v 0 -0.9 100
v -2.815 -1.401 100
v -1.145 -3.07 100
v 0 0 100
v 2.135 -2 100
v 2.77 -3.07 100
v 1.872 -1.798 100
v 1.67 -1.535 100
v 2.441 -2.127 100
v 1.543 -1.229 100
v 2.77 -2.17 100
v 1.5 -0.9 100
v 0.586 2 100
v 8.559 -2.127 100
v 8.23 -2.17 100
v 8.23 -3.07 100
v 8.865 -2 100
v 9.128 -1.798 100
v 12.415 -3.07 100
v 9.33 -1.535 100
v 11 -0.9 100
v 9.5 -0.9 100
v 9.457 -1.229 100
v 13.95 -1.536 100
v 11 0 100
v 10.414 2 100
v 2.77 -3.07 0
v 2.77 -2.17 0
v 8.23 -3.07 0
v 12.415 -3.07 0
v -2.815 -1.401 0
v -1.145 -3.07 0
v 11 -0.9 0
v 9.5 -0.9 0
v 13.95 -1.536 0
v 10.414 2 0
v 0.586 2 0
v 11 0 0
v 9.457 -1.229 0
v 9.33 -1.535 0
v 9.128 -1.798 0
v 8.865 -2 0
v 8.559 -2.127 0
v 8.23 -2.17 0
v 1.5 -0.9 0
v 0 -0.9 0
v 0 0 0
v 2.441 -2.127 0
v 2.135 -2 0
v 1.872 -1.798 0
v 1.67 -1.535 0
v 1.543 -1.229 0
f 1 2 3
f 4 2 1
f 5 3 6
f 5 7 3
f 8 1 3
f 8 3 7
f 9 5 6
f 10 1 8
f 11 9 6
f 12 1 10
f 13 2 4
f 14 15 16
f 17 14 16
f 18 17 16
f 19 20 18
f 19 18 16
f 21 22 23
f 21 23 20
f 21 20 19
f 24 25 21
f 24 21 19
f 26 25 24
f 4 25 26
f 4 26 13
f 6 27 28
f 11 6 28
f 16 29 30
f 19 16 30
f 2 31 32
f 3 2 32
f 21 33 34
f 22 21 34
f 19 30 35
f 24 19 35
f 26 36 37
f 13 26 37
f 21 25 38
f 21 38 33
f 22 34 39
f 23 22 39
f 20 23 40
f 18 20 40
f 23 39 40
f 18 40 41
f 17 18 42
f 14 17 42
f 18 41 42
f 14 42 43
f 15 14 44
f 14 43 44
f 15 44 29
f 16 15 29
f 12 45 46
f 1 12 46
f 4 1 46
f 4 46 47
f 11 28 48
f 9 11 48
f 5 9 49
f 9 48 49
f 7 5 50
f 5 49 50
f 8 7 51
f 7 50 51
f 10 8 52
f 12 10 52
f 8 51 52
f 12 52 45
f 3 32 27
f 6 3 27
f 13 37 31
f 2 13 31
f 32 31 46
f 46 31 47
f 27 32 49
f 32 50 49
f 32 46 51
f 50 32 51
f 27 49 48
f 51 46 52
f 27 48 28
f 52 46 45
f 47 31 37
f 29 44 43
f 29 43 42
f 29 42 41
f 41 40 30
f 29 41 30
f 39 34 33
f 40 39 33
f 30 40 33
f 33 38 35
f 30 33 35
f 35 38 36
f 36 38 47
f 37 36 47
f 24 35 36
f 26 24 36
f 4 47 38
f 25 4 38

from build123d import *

# Parameters (mm, degrees)
BOSS_EXTRUDE1_DEPTH = 100


with BuildPart() as part:
    # Sketch1 → Boss-Extrude1 (new body)
    with BuildSketch(Plane.XY):
        with BuildLine():
            Line((0, 0), (11, 0))
            Line((11, 0), (11, -0.9))
            Line((11, -0.9), (9.5, -0.9))
            ThreePointArc((9.5, -0.9), (9.128025612, -1.798025612), (8.23, -2.17))
            Line((8.23, -2.17), (8.23, -3.07))
            Line((8.23, -3.07), (12.415281374, -3.07))
            Line((12.415281374, -3.07), (13.949747468, -1.535533906))
            Line((13.949747468, -1.535533906), (10.414213562, 2))
            Line((10.414213562, 2), (0.585786438, 2))
            Line((0.585786438, 2), (-2.814747468, -1.400533906))
            Line((-2.814747468, -1.400533906), (-1.145281374, -3.07))
            Line((-1.145281374, -3.07), (2.77, -3.07))
            Line((2.77, -3.07), (2.77, -2.17))
            ThreePointArc((2.77, -2.17), (1.871974388, -1.798025612), (1.5, -0.9))
            Line((1.5, -0.9), (0, -0.9))
            Line((0, -0.9), (0, 0))
        make_face()
    extrude(amount=BOSS_EXTRUDE1_DEPTH)


solid = part.part
